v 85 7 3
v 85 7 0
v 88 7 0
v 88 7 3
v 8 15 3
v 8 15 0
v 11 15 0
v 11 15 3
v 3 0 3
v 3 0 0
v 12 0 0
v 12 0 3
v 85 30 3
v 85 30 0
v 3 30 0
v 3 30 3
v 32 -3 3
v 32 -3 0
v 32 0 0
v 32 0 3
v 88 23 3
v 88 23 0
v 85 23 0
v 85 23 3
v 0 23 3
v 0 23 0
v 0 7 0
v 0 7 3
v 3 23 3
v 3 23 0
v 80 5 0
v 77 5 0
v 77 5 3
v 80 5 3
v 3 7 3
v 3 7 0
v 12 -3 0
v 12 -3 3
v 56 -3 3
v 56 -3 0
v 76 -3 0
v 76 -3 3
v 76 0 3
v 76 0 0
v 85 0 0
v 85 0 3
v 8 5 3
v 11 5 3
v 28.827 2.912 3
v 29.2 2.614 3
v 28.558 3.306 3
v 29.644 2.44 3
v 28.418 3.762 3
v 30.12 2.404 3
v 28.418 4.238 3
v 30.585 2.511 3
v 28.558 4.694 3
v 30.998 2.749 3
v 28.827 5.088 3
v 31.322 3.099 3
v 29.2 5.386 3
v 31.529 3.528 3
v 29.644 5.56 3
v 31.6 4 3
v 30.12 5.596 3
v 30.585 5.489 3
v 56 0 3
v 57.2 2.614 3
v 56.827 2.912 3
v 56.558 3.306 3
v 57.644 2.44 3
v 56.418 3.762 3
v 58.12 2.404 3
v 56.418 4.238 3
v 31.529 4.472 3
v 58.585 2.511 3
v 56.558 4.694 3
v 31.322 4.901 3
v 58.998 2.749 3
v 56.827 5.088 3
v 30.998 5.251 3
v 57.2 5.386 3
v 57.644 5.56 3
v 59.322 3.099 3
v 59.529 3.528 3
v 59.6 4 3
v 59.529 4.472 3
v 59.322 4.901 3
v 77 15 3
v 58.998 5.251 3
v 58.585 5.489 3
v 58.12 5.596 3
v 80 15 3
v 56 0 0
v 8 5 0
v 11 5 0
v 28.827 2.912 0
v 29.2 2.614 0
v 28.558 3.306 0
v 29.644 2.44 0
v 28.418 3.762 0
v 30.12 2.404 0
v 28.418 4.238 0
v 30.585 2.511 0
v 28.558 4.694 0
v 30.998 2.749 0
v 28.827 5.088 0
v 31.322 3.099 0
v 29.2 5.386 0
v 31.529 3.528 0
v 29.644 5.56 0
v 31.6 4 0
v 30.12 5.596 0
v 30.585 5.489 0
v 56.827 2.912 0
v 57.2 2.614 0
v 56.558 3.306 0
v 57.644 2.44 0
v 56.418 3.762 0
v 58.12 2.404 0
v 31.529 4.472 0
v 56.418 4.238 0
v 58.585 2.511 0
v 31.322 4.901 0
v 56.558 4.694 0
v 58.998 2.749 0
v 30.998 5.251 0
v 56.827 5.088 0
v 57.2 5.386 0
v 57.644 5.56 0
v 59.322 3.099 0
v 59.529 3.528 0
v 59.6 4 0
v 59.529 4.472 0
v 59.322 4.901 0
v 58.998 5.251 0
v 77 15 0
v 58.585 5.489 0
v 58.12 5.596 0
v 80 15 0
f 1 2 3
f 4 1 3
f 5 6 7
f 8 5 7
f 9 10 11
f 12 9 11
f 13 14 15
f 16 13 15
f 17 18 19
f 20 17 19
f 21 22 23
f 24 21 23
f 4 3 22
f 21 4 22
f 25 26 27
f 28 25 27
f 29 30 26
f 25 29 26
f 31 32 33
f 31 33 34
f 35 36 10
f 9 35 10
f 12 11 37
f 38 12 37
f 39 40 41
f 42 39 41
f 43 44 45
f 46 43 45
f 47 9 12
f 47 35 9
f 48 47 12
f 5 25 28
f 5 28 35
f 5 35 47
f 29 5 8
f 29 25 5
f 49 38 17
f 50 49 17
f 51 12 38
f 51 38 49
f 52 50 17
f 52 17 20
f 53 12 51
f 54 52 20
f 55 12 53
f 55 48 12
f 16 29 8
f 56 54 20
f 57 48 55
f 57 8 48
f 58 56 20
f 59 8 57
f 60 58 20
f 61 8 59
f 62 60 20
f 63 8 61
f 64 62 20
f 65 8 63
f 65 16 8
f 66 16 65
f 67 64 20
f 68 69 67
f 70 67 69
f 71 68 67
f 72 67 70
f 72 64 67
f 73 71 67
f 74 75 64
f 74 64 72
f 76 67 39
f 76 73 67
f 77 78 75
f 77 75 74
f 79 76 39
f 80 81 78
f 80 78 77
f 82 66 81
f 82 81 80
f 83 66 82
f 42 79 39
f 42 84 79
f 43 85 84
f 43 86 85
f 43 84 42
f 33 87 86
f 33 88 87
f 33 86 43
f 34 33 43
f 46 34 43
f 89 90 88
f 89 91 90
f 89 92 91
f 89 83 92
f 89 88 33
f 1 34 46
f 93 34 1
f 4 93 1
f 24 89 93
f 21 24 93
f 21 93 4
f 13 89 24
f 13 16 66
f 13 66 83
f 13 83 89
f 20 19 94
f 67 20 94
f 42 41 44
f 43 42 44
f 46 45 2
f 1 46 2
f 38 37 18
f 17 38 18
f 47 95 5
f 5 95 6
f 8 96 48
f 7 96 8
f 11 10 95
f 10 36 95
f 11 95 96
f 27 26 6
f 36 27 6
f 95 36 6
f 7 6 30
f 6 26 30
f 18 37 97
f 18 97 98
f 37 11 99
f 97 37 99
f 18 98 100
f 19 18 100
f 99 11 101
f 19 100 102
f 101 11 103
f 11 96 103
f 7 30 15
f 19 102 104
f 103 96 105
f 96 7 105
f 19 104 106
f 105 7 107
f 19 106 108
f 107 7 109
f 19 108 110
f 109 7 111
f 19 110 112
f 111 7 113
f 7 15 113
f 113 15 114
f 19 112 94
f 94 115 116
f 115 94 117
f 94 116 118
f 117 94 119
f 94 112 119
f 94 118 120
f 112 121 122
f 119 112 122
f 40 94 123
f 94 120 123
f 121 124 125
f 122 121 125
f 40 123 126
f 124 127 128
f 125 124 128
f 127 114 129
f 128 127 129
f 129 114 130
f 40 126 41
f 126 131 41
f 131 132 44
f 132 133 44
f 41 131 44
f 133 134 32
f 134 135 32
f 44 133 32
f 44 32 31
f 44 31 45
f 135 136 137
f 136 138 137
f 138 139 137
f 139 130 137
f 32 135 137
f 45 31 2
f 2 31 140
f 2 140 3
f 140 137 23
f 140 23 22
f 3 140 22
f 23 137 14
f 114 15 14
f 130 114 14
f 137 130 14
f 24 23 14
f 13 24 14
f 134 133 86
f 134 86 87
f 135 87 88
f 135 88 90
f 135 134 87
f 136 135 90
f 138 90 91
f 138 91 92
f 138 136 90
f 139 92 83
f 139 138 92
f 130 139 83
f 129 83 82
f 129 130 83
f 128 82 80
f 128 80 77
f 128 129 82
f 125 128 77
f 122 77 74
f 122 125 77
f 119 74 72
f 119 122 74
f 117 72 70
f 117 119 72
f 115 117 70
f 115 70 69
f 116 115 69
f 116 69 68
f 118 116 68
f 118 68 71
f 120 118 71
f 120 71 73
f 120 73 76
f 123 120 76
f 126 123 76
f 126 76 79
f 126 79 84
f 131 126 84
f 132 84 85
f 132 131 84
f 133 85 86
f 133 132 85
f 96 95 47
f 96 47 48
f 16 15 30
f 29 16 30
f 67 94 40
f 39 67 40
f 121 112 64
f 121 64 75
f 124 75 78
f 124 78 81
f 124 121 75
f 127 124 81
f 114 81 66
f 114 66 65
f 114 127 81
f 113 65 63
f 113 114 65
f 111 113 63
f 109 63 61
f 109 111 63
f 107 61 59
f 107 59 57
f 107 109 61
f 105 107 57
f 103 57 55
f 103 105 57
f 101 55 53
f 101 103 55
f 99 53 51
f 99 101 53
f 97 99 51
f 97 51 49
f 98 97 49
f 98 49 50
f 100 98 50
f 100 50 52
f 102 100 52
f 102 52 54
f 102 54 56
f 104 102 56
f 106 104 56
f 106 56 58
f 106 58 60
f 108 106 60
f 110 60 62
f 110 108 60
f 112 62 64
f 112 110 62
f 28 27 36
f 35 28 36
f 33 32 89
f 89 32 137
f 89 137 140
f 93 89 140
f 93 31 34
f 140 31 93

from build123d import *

# Parameters (mm, degrees)
SKETCH_1_R      = 1.6
SKETCH_1_W      = 3
SKETCH_1_H      = 10
EXTRUDE_1_DEPTH = 3


with BuildPart() as part:
    # 草图1 → 凸台-拉伸1 (new body)
    with BuildSketch(Plane.XY):
        Polygon((3, 0), (12, 0), (12, -3), (32, -3), (32, 0), (56, 0), (56, -3), (76, -3), (76, 0), (85, 0), (85, 7), (88, 7), (88, 23), (85, 23), (85, 30), (3, 30), (3, 23), (0, 23), (0, 7), (3, 7), align=None)
        with Locations((30, 4)):
            Circle(SKETCH_1_R, mode=Mode.SUBTRACT)
        with Locations((58, 4)):
            Circle(SKETCH_1_R, mode=Mode.SUBTRACT)
        with Locations((9.5, 10)):
            Rectangle(SKETCH_1_W, SKETCH_1_H, mode=Mode.SUBTRACT)
        with Locations((78.5, 10)):
            Rectangle(SKETCH_1_W, SKETCH_1_H, mode=Mode.SUBTRACT)
    extrude(amount=EXTRUDE_1_DEPTH)


solid = part.part
